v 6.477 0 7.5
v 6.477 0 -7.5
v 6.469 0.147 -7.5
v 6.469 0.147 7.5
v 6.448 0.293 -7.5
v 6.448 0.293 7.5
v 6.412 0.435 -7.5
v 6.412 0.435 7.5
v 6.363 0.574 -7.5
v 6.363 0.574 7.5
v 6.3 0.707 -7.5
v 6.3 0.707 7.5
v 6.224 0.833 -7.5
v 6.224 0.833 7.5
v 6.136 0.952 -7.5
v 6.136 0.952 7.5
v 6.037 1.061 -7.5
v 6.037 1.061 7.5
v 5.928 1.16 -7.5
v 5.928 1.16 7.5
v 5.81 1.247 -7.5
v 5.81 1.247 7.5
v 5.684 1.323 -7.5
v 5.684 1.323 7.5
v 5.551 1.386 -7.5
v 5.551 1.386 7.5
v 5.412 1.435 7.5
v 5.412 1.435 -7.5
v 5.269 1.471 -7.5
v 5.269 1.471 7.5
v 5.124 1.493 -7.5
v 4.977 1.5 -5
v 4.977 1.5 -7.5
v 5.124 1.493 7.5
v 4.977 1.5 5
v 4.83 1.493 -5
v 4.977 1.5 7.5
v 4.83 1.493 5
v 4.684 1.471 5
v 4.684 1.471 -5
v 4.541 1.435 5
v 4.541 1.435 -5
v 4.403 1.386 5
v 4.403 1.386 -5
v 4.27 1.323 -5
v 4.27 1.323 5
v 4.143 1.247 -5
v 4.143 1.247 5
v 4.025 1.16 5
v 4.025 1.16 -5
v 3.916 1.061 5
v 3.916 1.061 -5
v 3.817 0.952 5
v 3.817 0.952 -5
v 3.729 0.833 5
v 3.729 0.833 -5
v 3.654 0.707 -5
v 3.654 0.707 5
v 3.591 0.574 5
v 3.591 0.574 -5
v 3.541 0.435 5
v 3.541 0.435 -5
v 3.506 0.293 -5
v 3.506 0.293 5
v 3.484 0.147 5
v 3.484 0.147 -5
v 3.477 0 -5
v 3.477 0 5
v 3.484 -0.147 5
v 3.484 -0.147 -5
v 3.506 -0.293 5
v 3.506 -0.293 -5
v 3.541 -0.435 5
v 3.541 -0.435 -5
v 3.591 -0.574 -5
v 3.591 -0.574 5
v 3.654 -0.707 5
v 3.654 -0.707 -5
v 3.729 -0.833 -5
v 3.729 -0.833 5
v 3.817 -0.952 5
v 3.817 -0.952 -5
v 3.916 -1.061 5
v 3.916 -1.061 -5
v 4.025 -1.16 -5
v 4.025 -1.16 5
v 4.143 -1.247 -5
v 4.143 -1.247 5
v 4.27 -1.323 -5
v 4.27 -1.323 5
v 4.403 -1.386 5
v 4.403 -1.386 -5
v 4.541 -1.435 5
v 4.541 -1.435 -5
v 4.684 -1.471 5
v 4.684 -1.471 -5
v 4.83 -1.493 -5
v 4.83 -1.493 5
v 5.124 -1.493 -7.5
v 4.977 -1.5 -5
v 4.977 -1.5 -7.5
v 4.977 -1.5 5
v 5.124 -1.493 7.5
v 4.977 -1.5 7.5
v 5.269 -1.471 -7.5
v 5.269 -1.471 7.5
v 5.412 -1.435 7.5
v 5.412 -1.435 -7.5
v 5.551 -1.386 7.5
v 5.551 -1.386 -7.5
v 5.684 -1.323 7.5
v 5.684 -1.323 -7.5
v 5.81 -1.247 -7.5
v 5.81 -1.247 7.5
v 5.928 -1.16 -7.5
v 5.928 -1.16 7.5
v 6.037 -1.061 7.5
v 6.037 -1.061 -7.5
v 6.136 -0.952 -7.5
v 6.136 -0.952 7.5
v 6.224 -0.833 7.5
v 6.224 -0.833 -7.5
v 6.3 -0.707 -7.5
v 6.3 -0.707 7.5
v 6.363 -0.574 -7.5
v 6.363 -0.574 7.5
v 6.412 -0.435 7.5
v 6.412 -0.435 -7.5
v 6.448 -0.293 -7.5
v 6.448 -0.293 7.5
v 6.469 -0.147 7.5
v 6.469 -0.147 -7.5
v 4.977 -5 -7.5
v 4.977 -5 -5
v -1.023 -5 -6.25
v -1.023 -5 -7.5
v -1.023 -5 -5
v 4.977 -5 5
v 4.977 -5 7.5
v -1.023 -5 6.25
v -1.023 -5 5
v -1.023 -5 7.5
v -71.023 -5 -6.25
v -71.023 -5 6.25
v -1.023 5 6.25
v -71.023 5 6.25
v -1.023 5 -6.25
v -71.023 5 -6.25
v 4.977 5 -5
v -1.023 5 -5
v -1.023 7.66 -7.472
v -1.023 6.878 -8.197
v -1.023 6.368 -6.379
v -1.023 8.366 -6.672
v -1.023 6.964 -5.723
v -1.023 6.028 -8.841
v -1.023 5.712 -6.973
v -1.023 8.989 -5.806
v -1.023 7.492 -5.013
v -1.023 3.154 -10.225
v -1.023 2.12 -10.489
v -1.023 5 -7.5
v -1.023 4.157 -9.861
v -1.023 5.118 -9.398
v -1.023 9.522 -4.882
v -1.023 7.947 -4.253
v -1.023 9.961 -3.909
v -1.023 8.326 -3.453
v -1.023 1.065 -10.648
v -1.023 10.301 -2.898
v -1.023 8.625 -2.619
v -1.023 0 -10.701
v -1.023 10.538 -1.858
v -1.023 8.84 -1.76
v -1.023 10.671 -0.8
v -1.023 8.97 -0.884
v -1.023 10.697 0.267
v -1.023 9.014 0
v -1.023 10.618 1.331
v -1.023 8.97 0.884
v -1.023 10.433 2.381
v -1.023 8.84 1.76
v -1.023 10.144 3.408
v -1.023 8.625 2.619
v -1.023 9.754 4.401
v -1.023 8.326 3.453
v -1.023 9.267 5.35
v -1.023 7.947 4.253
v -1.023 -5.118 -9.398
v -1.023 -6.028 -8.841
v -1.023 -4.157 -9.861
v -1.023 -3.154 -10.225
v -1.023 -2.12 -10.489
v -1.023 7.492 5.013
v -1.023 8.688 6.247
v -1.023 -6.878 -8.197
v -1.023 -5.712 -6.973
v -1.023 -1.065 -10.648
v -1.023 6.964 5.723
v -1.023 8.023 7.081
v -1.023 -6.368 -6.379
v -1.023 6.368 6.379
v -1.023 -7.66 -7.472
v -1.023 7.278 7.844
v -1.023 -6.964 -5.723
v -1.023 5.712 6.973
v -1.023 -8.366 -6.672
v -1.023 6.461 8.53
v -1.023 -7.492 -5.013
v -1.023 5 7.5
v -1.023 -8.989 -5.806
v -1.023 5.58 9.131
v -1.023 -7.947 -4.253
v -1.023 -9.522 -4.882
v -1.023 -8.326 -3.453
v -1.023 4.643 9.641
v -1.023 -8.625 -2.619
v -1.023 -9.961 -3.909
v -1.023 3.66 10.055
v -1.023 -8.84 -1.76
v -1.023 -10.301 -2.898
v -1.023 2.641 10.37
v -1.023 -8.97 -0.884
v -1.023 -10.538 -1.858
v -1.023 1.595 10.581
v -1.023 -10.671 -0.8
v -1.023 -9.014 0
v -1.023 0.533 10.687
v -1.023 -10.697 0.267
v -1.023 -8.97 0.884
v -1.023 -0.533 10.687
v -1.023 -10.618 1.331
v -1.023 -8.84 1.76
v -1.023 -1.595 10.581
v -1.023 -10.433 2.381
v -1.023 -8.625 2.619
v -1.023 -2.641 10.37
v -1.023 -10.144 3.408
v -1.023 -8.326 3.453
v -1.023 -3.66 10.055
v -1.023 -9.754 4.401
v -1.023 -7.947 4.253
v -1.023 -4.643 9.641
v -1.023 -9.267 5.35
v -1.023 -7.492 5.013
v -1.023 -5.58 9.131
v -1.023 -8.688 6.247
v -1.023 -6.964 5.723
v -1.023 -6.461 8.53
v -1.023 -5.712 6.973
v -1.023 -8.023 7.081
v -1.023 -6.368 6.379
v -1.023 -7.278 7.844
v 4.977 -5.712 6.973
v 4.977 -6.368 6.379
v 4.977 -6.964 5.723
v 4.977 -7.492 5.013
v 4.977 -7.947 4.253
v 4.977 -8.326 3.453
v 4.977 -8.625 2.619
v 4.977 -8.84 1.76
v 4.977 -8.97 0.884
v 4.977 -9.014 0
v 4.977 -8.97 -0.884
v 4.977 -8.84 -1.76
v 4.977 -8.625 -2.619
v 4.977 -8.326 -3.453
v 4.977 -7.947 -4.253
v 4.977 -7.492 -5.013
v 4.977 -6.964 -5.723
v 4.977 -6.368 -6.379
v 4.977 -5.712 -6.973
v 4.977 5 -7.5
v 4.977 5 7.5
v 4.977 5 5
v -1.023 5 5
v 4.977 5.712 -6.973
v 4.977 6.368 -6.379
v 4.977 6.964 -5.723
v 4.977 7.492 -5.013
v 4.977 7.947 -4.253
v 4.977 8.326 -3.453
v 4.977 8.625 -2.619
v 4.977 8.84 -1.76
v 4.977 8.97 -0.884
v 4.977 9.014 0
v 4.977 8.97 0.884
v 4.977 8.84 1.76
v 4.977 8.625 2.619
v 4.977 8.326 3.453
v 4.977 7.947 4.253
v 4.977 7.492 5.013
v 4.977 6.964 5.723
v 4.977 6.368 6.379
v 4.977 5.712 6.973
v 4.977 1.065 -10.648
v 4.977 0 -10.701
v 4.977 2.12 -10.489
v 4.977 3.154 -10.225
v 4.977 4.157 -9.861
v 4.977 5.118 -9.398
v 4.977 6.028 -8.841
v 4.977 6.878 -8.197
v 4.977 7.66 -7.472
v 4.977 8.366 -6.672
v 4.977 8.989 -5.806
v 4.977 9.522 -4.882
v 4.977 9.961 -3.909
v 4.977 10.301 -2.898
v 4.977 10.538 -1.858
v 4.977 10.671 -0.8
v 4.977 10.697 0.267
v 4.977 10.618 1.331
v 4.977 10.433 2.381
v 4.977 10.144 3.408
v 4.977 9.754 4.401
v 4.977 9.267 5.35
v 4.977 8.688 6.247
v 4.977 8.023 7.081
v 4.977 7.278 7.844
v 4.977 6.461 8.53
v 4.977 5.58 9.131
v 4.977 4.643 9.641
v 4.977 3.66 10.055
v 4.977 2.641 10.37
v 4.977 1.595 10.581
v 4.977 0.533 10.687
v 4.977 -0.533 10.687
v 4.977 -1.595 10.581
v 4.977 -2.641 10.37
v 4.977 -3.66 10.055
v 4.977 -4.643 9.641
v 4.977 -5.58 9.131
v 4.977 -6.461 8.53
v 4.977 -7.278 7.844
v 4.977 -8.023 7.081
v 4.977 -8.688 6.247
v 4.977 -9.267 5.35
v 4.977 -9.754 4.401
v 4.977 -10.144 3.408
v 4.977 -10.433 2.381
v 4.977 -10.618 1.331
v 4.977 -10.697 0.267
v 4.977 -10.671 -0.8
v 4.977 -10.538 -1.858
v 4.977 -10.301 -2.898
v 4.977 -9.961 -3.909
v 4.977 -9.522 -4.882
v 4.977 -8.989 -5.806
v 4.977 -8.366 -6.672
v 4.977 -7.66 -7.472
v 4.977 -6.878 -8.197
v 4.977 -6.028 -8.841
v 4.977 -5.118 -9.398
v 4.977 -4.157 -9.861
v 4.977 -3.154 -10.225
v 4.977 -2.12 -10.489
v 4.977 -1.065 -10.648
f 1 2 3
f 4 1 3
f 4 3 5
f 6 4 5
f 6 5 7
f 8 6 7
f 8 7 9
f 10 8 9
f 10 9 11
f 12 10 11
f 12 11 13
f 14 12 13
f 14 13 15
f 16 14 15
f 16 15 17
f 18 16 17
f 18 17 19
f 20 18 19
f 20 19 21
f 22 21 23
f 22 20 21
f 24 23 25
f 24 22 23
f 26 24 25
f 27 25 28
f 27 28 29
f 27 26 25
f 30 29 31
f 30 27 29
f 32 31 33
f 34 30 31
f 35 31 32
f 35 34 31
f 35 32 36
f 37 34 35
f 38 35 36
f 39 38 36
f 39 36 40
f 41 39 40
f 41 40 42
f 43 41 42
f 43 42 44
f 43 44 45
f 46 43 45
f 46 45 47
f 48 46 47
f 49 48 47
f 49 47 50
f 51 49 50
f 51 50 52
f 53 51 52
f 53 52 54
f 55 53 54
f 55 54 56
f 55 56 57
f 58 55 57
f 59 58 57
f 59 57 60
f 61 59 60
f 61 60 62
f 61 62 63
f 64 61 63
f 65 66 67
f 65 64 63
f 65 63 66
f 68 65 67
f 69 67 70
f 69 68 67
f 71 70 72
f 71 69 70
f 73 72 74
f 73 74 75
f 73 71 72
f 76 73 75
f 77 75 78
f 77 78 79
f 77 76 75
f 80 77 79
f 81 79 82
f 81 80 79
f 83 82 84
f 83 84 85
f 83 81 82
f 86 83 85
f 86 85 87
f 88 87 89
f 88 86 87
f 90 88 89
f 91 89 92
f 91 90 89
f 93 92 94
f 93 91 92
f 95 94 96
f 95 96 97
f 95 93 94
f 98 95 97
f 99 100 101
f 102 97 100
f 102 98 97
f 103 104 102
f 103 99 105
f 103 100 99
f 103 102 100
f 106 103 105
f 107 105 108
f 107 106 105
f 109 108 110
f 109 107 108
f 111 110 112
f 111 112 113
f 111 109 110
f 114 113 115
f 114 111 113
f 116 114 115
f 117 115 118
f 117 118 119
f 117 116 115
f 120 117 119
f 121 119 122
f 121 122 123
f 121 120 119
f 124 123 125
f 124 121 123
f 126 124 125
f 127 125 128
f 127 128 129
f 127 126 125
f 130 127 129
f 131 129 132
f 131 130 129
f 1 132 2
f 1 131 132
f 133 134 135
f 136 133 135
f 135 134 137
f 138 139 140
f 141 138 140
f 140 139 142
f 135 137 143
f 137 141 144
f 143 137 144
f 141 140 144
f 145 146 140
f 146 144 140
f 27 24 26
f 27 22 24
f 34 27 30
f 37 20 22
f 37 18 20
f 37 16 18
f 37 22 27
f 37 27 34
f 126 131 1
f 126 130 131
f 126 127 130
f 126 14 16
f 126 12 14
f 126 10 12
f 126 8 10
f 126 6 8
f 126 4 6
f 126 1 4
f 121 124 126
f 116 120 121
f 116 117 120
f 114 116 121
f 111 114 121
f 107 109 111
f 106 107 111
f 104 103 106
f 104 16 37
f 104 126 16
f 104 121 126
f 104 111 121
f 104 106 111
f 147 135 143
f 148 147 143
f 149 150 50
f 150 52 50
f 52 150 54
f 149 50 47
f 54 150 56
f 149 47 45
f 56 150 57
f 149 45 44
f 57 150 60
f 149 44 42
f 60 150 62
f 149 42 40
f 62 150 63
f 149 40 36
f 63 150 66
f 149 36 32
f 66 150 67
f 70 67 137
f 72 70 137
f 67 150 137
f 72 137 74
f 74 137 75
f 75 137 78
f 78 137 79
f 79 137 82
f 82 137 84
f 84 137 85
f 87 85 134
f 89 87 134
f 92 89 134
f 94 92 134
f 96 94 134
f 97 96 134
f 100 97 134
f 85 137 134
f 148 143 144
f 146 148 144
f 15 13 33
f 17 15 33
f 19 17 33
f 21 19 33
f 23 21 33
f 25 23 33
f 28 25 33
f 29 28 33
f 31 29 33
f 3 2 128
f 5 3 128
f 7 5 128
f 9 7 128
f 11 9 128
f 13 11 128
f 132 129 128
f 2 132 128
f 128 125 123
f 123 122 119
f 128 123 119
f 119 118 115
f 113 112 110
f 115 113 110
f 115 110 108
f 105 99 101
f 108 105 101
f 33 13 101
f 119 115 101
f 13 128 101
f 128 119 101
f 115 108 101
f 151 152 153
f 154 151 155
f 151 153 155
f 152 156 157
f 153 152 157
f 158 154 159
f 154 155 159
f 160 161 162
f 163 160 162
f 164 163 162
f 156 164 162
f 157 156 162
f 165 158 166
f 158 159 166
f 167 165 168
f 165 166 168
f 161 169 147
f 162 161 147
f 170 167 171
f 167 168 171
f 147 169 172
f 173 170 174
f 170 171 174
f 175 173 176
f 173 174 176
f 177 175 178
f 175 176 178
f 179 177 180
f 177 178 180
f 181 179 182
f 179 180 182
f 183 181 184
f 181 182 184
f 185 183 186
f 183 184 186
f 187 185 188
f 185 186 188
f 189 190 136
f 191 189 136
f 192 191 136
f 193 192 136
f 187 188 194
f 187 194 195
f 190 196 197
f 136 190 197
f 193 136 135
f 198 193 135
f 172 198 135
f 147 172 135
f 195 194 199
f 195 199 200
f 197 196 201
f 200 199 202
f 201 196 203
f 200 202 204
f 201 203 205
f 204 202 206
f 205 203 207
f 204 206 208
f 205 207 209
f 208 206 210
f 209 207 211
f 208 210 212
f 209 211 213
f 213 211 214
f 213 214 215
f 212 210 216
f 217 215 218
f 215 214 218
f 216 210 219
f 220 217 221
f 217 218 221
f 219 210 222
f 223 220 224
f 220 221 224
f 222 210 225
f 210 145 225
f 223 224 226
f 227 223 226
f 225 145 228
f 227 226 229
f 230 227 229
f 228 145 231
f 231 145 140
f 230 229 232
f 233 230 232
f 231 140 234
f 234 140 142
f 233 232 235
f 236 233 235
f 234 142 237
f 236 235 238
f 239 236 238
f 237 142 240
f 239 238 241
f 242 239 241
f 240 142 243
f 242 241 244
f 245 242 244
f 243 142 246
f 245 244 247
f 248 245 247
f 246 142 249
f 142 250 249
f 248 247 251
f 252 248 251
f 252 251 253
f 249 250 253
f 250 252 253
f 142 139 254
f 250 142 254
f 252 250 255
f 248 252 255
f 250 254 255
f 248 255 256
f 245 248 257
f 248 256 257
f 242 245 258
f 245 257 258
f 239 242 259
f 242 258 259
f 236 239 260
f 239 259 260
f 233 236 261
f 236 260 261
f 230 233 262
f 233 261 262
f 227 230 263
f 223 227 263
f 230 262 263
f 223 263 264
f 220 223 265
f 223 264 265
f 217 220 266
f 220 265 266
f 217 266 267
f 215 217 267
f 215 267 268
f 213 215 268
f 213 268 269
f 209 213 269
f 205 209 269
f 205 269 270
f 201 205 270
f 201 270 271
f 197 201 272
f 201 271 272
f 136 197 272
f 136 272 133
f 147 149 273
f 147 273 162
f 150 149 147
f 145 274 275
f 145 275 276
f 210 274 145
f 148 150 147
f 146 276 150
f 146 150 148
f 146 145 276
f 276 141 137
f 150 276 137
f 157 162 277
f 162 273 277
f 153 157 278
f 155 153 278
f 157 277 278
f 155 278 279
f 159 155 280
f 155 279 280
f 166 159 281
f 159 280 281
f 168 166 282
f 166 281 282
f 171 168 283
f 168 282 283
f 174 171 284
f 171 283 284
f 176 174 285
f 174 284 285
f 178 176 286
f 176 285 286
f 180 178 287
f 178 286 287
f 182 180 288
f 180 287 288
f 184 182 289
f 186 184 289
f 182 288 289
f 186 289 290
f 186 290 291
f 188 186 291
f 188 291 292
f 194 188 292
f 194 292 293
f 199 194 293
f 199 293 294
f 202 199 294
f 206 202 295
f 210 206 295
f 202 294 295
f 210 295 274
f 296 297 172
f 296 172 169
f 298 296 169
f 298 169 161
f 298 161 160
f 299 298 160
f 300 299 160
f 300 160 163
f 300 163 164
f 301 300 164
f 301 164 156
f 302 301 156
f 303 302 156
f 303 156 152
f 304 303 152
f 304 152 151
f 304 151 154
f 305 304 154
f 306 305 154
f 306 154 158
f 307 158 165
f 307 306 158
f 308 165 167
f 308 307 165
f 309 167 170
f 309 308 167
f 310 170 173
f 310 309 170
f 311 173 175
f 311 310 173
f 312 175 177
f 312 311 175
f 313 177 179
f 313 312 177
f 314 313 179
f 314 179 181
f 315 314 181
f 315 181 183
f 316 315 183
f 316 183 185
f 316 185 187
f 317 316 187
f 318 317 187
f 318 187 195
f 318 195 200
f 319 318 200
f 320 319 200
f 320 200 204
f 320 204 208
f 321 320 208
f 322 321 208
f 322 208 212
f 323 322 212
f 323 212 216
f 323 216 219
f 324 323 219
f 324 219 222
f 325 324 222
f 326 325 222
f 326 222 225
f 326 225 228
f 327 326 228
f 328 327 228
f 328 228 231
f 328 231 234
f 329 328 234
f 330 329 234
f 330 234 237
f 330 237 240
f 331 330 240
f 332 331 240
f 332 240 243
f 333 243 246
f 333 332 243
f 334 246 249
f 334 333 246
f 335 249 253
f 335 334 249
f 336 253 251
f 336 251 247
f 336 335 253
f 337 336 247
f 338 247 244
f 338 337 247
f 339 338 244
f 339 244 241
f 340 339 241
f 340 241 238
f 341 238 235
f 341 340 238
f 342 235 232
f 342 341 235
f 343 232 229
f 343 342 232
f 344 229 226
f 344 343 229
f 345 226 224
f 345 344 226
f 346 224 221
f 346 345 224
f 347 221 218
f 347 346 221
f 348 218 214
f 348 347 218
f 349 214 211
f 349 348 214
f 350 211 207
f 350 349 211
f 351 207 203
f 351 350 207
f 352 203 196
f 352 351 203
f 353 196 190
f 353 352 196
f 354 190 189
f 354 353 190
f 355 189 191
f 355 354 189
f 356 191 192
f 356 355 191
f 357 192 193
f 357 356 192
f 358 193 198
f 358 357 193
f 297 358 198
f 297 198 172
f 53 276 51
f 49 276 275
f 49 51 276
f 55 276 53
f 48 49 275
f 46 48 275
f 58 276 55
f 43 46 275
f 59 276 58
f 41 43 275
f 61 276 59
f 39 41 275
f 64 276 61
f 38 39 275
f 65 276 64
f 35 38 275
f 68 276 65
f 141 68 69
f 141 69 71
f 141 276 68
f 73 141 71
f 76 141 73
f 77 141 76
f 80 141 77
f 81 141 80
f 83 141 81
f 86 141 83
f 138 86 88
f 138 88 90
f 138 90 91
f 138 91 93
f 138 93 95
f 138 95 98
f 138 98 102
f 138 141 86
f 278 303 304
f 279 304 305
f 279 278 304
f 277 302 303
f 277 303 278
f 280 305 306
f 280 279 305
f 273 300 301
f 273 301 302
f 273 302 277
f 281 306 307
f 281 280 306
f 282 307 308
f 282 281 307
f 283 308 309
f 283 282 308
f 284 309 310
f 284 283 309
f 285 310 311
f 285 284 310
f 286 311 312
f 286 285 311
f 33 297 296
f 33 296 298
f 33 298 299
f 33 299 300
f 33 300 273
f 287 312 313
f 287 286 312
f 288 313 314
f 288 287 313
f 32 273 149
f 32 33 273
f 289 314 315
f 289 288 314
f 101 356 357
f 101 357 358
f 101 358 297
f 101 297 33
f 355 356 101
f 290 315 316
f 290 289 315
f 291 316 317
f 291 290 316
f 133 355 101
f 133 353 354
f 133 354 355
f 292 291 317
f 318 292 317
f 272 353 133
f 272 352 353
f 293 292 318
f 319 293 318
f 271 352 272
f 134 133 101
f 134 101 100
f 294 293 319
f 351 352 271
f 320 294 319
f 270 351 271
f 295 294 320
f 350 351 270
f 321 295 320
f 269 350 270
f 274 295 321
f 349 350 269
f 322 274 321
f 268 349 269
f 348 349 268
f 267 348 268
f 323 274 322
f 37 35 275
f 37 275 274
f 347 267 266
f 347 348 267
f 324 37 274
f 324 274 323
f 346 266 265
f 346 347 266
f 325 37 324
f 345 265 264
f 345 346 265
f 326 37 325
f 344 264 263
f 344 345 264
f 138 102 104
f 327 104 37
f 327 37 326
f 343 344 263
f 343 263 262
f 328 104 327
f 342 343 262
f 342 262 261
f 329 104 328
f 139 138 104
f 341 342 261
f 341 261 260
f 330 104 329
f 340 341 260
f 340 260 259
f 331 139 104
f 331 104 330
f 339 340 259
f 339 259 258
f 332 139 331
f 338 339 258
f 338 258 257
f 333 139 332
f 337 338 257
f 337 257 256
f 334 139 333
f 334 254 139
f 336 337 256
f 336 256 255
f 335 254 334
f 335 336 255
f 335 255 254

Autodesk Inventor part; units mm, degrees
ref_plane "YZ Plane" through (0, 0, 0) normal (1, 0, 0) x (0, 1, 0)
ref_plane "XZ Plane" through (0, 0, 0) normal (0, 1, 0) x (-1, 0, 0)
ref_plane "XY Plane" through (0, 0, 0) normal (0, 0, 1) x (1, 0, 0)
sketch "草圖1" plane through (0, 0, 0) normal (0, 1, 0) x (-1, 0, 0)
  line L0 (71.0233, 6.25) -> (1.0233, 6.25)
  line L1 (1.0233, 6.25) -> (1.0233, -6.25)
  line L2 (1.0233, -6.25) -> (71.0233, -6.25)
  line L3 (71.0233, -6.25) -> (71.0233, 6.25)
  line L4 (1.0233, 5) -> (-4.9767, 5)
  line L5 (-4.9767, 5) -> (-4.9767, 7.5)
  line L6 (-4.9767, 7.5) -> (1.0233, 7.5)
  line L7 (1.0233, 7.5) -> (1.0233, 5)
  line L8 (1.0233, -5) -> (-4.9767, -5)
  line L9 (-4.9767, -5) -> (-4.9767, -7.5)
  line L10 (-4.9767, -7.5) -> (1.0233, -7.5)
  line L11 (1.0233, -7.5) -> (1.0233, -5)
  point P0 (0, 0)
  point P1 (1.0233, 6.25)
  dimension "d0" = 6
  dimension "d2" = 5
  dimension "d3" = 10
  dimension "d4" = 2.5
  dimension "d5" = 12.5
  dimension "d6" = 6.25
  dimension "d7" = 70
extrude "擠出1" add sketch "草圖1" along normal mid plane 10
sketch "草圖2" plane through (-1.0233, 5, 7.5) normal (0, 0, 1) x (1, 0, 0)
  line L0 (6, -10) -> (6, 0) projected
  circle A0 centre (6, -5) radius 1.5
  point P0 (1.0233, -5)
  dimension "d10" = 3
extrude "擠出2" add sketch "草圖2" against normal up to surface (15 mm away)
sketch "草圖3" plane through (4.9767, 5, 7.5) normal (1, 0, 0) x (0, 0, -1)
  line L0 (15, -10) -> (12.5, -10) projected
  circle A0 centre (7.5, -5) radius 9.0139
  circle A1 centre (7.5, -5) radius 10.7008
  line L1 (15, -3.5) -> (15, 0) projected
  line L2 (15, -10) -> (15, 0)
  line L3 (2.5, -10) -> (0, -10) projected
  line L4 (0, -3.5) -> (0, 0) projected
  line L5 (0, -10) -> (0, 0)
extrude "擠出3" add sketch "草圖3" against normal up to surface (6 mm away) contours A0 L2 L1 | L4 L5 A0 | A1
equation "\"d6\" = 0.5 * d5"
properties part number "axis_rf"
